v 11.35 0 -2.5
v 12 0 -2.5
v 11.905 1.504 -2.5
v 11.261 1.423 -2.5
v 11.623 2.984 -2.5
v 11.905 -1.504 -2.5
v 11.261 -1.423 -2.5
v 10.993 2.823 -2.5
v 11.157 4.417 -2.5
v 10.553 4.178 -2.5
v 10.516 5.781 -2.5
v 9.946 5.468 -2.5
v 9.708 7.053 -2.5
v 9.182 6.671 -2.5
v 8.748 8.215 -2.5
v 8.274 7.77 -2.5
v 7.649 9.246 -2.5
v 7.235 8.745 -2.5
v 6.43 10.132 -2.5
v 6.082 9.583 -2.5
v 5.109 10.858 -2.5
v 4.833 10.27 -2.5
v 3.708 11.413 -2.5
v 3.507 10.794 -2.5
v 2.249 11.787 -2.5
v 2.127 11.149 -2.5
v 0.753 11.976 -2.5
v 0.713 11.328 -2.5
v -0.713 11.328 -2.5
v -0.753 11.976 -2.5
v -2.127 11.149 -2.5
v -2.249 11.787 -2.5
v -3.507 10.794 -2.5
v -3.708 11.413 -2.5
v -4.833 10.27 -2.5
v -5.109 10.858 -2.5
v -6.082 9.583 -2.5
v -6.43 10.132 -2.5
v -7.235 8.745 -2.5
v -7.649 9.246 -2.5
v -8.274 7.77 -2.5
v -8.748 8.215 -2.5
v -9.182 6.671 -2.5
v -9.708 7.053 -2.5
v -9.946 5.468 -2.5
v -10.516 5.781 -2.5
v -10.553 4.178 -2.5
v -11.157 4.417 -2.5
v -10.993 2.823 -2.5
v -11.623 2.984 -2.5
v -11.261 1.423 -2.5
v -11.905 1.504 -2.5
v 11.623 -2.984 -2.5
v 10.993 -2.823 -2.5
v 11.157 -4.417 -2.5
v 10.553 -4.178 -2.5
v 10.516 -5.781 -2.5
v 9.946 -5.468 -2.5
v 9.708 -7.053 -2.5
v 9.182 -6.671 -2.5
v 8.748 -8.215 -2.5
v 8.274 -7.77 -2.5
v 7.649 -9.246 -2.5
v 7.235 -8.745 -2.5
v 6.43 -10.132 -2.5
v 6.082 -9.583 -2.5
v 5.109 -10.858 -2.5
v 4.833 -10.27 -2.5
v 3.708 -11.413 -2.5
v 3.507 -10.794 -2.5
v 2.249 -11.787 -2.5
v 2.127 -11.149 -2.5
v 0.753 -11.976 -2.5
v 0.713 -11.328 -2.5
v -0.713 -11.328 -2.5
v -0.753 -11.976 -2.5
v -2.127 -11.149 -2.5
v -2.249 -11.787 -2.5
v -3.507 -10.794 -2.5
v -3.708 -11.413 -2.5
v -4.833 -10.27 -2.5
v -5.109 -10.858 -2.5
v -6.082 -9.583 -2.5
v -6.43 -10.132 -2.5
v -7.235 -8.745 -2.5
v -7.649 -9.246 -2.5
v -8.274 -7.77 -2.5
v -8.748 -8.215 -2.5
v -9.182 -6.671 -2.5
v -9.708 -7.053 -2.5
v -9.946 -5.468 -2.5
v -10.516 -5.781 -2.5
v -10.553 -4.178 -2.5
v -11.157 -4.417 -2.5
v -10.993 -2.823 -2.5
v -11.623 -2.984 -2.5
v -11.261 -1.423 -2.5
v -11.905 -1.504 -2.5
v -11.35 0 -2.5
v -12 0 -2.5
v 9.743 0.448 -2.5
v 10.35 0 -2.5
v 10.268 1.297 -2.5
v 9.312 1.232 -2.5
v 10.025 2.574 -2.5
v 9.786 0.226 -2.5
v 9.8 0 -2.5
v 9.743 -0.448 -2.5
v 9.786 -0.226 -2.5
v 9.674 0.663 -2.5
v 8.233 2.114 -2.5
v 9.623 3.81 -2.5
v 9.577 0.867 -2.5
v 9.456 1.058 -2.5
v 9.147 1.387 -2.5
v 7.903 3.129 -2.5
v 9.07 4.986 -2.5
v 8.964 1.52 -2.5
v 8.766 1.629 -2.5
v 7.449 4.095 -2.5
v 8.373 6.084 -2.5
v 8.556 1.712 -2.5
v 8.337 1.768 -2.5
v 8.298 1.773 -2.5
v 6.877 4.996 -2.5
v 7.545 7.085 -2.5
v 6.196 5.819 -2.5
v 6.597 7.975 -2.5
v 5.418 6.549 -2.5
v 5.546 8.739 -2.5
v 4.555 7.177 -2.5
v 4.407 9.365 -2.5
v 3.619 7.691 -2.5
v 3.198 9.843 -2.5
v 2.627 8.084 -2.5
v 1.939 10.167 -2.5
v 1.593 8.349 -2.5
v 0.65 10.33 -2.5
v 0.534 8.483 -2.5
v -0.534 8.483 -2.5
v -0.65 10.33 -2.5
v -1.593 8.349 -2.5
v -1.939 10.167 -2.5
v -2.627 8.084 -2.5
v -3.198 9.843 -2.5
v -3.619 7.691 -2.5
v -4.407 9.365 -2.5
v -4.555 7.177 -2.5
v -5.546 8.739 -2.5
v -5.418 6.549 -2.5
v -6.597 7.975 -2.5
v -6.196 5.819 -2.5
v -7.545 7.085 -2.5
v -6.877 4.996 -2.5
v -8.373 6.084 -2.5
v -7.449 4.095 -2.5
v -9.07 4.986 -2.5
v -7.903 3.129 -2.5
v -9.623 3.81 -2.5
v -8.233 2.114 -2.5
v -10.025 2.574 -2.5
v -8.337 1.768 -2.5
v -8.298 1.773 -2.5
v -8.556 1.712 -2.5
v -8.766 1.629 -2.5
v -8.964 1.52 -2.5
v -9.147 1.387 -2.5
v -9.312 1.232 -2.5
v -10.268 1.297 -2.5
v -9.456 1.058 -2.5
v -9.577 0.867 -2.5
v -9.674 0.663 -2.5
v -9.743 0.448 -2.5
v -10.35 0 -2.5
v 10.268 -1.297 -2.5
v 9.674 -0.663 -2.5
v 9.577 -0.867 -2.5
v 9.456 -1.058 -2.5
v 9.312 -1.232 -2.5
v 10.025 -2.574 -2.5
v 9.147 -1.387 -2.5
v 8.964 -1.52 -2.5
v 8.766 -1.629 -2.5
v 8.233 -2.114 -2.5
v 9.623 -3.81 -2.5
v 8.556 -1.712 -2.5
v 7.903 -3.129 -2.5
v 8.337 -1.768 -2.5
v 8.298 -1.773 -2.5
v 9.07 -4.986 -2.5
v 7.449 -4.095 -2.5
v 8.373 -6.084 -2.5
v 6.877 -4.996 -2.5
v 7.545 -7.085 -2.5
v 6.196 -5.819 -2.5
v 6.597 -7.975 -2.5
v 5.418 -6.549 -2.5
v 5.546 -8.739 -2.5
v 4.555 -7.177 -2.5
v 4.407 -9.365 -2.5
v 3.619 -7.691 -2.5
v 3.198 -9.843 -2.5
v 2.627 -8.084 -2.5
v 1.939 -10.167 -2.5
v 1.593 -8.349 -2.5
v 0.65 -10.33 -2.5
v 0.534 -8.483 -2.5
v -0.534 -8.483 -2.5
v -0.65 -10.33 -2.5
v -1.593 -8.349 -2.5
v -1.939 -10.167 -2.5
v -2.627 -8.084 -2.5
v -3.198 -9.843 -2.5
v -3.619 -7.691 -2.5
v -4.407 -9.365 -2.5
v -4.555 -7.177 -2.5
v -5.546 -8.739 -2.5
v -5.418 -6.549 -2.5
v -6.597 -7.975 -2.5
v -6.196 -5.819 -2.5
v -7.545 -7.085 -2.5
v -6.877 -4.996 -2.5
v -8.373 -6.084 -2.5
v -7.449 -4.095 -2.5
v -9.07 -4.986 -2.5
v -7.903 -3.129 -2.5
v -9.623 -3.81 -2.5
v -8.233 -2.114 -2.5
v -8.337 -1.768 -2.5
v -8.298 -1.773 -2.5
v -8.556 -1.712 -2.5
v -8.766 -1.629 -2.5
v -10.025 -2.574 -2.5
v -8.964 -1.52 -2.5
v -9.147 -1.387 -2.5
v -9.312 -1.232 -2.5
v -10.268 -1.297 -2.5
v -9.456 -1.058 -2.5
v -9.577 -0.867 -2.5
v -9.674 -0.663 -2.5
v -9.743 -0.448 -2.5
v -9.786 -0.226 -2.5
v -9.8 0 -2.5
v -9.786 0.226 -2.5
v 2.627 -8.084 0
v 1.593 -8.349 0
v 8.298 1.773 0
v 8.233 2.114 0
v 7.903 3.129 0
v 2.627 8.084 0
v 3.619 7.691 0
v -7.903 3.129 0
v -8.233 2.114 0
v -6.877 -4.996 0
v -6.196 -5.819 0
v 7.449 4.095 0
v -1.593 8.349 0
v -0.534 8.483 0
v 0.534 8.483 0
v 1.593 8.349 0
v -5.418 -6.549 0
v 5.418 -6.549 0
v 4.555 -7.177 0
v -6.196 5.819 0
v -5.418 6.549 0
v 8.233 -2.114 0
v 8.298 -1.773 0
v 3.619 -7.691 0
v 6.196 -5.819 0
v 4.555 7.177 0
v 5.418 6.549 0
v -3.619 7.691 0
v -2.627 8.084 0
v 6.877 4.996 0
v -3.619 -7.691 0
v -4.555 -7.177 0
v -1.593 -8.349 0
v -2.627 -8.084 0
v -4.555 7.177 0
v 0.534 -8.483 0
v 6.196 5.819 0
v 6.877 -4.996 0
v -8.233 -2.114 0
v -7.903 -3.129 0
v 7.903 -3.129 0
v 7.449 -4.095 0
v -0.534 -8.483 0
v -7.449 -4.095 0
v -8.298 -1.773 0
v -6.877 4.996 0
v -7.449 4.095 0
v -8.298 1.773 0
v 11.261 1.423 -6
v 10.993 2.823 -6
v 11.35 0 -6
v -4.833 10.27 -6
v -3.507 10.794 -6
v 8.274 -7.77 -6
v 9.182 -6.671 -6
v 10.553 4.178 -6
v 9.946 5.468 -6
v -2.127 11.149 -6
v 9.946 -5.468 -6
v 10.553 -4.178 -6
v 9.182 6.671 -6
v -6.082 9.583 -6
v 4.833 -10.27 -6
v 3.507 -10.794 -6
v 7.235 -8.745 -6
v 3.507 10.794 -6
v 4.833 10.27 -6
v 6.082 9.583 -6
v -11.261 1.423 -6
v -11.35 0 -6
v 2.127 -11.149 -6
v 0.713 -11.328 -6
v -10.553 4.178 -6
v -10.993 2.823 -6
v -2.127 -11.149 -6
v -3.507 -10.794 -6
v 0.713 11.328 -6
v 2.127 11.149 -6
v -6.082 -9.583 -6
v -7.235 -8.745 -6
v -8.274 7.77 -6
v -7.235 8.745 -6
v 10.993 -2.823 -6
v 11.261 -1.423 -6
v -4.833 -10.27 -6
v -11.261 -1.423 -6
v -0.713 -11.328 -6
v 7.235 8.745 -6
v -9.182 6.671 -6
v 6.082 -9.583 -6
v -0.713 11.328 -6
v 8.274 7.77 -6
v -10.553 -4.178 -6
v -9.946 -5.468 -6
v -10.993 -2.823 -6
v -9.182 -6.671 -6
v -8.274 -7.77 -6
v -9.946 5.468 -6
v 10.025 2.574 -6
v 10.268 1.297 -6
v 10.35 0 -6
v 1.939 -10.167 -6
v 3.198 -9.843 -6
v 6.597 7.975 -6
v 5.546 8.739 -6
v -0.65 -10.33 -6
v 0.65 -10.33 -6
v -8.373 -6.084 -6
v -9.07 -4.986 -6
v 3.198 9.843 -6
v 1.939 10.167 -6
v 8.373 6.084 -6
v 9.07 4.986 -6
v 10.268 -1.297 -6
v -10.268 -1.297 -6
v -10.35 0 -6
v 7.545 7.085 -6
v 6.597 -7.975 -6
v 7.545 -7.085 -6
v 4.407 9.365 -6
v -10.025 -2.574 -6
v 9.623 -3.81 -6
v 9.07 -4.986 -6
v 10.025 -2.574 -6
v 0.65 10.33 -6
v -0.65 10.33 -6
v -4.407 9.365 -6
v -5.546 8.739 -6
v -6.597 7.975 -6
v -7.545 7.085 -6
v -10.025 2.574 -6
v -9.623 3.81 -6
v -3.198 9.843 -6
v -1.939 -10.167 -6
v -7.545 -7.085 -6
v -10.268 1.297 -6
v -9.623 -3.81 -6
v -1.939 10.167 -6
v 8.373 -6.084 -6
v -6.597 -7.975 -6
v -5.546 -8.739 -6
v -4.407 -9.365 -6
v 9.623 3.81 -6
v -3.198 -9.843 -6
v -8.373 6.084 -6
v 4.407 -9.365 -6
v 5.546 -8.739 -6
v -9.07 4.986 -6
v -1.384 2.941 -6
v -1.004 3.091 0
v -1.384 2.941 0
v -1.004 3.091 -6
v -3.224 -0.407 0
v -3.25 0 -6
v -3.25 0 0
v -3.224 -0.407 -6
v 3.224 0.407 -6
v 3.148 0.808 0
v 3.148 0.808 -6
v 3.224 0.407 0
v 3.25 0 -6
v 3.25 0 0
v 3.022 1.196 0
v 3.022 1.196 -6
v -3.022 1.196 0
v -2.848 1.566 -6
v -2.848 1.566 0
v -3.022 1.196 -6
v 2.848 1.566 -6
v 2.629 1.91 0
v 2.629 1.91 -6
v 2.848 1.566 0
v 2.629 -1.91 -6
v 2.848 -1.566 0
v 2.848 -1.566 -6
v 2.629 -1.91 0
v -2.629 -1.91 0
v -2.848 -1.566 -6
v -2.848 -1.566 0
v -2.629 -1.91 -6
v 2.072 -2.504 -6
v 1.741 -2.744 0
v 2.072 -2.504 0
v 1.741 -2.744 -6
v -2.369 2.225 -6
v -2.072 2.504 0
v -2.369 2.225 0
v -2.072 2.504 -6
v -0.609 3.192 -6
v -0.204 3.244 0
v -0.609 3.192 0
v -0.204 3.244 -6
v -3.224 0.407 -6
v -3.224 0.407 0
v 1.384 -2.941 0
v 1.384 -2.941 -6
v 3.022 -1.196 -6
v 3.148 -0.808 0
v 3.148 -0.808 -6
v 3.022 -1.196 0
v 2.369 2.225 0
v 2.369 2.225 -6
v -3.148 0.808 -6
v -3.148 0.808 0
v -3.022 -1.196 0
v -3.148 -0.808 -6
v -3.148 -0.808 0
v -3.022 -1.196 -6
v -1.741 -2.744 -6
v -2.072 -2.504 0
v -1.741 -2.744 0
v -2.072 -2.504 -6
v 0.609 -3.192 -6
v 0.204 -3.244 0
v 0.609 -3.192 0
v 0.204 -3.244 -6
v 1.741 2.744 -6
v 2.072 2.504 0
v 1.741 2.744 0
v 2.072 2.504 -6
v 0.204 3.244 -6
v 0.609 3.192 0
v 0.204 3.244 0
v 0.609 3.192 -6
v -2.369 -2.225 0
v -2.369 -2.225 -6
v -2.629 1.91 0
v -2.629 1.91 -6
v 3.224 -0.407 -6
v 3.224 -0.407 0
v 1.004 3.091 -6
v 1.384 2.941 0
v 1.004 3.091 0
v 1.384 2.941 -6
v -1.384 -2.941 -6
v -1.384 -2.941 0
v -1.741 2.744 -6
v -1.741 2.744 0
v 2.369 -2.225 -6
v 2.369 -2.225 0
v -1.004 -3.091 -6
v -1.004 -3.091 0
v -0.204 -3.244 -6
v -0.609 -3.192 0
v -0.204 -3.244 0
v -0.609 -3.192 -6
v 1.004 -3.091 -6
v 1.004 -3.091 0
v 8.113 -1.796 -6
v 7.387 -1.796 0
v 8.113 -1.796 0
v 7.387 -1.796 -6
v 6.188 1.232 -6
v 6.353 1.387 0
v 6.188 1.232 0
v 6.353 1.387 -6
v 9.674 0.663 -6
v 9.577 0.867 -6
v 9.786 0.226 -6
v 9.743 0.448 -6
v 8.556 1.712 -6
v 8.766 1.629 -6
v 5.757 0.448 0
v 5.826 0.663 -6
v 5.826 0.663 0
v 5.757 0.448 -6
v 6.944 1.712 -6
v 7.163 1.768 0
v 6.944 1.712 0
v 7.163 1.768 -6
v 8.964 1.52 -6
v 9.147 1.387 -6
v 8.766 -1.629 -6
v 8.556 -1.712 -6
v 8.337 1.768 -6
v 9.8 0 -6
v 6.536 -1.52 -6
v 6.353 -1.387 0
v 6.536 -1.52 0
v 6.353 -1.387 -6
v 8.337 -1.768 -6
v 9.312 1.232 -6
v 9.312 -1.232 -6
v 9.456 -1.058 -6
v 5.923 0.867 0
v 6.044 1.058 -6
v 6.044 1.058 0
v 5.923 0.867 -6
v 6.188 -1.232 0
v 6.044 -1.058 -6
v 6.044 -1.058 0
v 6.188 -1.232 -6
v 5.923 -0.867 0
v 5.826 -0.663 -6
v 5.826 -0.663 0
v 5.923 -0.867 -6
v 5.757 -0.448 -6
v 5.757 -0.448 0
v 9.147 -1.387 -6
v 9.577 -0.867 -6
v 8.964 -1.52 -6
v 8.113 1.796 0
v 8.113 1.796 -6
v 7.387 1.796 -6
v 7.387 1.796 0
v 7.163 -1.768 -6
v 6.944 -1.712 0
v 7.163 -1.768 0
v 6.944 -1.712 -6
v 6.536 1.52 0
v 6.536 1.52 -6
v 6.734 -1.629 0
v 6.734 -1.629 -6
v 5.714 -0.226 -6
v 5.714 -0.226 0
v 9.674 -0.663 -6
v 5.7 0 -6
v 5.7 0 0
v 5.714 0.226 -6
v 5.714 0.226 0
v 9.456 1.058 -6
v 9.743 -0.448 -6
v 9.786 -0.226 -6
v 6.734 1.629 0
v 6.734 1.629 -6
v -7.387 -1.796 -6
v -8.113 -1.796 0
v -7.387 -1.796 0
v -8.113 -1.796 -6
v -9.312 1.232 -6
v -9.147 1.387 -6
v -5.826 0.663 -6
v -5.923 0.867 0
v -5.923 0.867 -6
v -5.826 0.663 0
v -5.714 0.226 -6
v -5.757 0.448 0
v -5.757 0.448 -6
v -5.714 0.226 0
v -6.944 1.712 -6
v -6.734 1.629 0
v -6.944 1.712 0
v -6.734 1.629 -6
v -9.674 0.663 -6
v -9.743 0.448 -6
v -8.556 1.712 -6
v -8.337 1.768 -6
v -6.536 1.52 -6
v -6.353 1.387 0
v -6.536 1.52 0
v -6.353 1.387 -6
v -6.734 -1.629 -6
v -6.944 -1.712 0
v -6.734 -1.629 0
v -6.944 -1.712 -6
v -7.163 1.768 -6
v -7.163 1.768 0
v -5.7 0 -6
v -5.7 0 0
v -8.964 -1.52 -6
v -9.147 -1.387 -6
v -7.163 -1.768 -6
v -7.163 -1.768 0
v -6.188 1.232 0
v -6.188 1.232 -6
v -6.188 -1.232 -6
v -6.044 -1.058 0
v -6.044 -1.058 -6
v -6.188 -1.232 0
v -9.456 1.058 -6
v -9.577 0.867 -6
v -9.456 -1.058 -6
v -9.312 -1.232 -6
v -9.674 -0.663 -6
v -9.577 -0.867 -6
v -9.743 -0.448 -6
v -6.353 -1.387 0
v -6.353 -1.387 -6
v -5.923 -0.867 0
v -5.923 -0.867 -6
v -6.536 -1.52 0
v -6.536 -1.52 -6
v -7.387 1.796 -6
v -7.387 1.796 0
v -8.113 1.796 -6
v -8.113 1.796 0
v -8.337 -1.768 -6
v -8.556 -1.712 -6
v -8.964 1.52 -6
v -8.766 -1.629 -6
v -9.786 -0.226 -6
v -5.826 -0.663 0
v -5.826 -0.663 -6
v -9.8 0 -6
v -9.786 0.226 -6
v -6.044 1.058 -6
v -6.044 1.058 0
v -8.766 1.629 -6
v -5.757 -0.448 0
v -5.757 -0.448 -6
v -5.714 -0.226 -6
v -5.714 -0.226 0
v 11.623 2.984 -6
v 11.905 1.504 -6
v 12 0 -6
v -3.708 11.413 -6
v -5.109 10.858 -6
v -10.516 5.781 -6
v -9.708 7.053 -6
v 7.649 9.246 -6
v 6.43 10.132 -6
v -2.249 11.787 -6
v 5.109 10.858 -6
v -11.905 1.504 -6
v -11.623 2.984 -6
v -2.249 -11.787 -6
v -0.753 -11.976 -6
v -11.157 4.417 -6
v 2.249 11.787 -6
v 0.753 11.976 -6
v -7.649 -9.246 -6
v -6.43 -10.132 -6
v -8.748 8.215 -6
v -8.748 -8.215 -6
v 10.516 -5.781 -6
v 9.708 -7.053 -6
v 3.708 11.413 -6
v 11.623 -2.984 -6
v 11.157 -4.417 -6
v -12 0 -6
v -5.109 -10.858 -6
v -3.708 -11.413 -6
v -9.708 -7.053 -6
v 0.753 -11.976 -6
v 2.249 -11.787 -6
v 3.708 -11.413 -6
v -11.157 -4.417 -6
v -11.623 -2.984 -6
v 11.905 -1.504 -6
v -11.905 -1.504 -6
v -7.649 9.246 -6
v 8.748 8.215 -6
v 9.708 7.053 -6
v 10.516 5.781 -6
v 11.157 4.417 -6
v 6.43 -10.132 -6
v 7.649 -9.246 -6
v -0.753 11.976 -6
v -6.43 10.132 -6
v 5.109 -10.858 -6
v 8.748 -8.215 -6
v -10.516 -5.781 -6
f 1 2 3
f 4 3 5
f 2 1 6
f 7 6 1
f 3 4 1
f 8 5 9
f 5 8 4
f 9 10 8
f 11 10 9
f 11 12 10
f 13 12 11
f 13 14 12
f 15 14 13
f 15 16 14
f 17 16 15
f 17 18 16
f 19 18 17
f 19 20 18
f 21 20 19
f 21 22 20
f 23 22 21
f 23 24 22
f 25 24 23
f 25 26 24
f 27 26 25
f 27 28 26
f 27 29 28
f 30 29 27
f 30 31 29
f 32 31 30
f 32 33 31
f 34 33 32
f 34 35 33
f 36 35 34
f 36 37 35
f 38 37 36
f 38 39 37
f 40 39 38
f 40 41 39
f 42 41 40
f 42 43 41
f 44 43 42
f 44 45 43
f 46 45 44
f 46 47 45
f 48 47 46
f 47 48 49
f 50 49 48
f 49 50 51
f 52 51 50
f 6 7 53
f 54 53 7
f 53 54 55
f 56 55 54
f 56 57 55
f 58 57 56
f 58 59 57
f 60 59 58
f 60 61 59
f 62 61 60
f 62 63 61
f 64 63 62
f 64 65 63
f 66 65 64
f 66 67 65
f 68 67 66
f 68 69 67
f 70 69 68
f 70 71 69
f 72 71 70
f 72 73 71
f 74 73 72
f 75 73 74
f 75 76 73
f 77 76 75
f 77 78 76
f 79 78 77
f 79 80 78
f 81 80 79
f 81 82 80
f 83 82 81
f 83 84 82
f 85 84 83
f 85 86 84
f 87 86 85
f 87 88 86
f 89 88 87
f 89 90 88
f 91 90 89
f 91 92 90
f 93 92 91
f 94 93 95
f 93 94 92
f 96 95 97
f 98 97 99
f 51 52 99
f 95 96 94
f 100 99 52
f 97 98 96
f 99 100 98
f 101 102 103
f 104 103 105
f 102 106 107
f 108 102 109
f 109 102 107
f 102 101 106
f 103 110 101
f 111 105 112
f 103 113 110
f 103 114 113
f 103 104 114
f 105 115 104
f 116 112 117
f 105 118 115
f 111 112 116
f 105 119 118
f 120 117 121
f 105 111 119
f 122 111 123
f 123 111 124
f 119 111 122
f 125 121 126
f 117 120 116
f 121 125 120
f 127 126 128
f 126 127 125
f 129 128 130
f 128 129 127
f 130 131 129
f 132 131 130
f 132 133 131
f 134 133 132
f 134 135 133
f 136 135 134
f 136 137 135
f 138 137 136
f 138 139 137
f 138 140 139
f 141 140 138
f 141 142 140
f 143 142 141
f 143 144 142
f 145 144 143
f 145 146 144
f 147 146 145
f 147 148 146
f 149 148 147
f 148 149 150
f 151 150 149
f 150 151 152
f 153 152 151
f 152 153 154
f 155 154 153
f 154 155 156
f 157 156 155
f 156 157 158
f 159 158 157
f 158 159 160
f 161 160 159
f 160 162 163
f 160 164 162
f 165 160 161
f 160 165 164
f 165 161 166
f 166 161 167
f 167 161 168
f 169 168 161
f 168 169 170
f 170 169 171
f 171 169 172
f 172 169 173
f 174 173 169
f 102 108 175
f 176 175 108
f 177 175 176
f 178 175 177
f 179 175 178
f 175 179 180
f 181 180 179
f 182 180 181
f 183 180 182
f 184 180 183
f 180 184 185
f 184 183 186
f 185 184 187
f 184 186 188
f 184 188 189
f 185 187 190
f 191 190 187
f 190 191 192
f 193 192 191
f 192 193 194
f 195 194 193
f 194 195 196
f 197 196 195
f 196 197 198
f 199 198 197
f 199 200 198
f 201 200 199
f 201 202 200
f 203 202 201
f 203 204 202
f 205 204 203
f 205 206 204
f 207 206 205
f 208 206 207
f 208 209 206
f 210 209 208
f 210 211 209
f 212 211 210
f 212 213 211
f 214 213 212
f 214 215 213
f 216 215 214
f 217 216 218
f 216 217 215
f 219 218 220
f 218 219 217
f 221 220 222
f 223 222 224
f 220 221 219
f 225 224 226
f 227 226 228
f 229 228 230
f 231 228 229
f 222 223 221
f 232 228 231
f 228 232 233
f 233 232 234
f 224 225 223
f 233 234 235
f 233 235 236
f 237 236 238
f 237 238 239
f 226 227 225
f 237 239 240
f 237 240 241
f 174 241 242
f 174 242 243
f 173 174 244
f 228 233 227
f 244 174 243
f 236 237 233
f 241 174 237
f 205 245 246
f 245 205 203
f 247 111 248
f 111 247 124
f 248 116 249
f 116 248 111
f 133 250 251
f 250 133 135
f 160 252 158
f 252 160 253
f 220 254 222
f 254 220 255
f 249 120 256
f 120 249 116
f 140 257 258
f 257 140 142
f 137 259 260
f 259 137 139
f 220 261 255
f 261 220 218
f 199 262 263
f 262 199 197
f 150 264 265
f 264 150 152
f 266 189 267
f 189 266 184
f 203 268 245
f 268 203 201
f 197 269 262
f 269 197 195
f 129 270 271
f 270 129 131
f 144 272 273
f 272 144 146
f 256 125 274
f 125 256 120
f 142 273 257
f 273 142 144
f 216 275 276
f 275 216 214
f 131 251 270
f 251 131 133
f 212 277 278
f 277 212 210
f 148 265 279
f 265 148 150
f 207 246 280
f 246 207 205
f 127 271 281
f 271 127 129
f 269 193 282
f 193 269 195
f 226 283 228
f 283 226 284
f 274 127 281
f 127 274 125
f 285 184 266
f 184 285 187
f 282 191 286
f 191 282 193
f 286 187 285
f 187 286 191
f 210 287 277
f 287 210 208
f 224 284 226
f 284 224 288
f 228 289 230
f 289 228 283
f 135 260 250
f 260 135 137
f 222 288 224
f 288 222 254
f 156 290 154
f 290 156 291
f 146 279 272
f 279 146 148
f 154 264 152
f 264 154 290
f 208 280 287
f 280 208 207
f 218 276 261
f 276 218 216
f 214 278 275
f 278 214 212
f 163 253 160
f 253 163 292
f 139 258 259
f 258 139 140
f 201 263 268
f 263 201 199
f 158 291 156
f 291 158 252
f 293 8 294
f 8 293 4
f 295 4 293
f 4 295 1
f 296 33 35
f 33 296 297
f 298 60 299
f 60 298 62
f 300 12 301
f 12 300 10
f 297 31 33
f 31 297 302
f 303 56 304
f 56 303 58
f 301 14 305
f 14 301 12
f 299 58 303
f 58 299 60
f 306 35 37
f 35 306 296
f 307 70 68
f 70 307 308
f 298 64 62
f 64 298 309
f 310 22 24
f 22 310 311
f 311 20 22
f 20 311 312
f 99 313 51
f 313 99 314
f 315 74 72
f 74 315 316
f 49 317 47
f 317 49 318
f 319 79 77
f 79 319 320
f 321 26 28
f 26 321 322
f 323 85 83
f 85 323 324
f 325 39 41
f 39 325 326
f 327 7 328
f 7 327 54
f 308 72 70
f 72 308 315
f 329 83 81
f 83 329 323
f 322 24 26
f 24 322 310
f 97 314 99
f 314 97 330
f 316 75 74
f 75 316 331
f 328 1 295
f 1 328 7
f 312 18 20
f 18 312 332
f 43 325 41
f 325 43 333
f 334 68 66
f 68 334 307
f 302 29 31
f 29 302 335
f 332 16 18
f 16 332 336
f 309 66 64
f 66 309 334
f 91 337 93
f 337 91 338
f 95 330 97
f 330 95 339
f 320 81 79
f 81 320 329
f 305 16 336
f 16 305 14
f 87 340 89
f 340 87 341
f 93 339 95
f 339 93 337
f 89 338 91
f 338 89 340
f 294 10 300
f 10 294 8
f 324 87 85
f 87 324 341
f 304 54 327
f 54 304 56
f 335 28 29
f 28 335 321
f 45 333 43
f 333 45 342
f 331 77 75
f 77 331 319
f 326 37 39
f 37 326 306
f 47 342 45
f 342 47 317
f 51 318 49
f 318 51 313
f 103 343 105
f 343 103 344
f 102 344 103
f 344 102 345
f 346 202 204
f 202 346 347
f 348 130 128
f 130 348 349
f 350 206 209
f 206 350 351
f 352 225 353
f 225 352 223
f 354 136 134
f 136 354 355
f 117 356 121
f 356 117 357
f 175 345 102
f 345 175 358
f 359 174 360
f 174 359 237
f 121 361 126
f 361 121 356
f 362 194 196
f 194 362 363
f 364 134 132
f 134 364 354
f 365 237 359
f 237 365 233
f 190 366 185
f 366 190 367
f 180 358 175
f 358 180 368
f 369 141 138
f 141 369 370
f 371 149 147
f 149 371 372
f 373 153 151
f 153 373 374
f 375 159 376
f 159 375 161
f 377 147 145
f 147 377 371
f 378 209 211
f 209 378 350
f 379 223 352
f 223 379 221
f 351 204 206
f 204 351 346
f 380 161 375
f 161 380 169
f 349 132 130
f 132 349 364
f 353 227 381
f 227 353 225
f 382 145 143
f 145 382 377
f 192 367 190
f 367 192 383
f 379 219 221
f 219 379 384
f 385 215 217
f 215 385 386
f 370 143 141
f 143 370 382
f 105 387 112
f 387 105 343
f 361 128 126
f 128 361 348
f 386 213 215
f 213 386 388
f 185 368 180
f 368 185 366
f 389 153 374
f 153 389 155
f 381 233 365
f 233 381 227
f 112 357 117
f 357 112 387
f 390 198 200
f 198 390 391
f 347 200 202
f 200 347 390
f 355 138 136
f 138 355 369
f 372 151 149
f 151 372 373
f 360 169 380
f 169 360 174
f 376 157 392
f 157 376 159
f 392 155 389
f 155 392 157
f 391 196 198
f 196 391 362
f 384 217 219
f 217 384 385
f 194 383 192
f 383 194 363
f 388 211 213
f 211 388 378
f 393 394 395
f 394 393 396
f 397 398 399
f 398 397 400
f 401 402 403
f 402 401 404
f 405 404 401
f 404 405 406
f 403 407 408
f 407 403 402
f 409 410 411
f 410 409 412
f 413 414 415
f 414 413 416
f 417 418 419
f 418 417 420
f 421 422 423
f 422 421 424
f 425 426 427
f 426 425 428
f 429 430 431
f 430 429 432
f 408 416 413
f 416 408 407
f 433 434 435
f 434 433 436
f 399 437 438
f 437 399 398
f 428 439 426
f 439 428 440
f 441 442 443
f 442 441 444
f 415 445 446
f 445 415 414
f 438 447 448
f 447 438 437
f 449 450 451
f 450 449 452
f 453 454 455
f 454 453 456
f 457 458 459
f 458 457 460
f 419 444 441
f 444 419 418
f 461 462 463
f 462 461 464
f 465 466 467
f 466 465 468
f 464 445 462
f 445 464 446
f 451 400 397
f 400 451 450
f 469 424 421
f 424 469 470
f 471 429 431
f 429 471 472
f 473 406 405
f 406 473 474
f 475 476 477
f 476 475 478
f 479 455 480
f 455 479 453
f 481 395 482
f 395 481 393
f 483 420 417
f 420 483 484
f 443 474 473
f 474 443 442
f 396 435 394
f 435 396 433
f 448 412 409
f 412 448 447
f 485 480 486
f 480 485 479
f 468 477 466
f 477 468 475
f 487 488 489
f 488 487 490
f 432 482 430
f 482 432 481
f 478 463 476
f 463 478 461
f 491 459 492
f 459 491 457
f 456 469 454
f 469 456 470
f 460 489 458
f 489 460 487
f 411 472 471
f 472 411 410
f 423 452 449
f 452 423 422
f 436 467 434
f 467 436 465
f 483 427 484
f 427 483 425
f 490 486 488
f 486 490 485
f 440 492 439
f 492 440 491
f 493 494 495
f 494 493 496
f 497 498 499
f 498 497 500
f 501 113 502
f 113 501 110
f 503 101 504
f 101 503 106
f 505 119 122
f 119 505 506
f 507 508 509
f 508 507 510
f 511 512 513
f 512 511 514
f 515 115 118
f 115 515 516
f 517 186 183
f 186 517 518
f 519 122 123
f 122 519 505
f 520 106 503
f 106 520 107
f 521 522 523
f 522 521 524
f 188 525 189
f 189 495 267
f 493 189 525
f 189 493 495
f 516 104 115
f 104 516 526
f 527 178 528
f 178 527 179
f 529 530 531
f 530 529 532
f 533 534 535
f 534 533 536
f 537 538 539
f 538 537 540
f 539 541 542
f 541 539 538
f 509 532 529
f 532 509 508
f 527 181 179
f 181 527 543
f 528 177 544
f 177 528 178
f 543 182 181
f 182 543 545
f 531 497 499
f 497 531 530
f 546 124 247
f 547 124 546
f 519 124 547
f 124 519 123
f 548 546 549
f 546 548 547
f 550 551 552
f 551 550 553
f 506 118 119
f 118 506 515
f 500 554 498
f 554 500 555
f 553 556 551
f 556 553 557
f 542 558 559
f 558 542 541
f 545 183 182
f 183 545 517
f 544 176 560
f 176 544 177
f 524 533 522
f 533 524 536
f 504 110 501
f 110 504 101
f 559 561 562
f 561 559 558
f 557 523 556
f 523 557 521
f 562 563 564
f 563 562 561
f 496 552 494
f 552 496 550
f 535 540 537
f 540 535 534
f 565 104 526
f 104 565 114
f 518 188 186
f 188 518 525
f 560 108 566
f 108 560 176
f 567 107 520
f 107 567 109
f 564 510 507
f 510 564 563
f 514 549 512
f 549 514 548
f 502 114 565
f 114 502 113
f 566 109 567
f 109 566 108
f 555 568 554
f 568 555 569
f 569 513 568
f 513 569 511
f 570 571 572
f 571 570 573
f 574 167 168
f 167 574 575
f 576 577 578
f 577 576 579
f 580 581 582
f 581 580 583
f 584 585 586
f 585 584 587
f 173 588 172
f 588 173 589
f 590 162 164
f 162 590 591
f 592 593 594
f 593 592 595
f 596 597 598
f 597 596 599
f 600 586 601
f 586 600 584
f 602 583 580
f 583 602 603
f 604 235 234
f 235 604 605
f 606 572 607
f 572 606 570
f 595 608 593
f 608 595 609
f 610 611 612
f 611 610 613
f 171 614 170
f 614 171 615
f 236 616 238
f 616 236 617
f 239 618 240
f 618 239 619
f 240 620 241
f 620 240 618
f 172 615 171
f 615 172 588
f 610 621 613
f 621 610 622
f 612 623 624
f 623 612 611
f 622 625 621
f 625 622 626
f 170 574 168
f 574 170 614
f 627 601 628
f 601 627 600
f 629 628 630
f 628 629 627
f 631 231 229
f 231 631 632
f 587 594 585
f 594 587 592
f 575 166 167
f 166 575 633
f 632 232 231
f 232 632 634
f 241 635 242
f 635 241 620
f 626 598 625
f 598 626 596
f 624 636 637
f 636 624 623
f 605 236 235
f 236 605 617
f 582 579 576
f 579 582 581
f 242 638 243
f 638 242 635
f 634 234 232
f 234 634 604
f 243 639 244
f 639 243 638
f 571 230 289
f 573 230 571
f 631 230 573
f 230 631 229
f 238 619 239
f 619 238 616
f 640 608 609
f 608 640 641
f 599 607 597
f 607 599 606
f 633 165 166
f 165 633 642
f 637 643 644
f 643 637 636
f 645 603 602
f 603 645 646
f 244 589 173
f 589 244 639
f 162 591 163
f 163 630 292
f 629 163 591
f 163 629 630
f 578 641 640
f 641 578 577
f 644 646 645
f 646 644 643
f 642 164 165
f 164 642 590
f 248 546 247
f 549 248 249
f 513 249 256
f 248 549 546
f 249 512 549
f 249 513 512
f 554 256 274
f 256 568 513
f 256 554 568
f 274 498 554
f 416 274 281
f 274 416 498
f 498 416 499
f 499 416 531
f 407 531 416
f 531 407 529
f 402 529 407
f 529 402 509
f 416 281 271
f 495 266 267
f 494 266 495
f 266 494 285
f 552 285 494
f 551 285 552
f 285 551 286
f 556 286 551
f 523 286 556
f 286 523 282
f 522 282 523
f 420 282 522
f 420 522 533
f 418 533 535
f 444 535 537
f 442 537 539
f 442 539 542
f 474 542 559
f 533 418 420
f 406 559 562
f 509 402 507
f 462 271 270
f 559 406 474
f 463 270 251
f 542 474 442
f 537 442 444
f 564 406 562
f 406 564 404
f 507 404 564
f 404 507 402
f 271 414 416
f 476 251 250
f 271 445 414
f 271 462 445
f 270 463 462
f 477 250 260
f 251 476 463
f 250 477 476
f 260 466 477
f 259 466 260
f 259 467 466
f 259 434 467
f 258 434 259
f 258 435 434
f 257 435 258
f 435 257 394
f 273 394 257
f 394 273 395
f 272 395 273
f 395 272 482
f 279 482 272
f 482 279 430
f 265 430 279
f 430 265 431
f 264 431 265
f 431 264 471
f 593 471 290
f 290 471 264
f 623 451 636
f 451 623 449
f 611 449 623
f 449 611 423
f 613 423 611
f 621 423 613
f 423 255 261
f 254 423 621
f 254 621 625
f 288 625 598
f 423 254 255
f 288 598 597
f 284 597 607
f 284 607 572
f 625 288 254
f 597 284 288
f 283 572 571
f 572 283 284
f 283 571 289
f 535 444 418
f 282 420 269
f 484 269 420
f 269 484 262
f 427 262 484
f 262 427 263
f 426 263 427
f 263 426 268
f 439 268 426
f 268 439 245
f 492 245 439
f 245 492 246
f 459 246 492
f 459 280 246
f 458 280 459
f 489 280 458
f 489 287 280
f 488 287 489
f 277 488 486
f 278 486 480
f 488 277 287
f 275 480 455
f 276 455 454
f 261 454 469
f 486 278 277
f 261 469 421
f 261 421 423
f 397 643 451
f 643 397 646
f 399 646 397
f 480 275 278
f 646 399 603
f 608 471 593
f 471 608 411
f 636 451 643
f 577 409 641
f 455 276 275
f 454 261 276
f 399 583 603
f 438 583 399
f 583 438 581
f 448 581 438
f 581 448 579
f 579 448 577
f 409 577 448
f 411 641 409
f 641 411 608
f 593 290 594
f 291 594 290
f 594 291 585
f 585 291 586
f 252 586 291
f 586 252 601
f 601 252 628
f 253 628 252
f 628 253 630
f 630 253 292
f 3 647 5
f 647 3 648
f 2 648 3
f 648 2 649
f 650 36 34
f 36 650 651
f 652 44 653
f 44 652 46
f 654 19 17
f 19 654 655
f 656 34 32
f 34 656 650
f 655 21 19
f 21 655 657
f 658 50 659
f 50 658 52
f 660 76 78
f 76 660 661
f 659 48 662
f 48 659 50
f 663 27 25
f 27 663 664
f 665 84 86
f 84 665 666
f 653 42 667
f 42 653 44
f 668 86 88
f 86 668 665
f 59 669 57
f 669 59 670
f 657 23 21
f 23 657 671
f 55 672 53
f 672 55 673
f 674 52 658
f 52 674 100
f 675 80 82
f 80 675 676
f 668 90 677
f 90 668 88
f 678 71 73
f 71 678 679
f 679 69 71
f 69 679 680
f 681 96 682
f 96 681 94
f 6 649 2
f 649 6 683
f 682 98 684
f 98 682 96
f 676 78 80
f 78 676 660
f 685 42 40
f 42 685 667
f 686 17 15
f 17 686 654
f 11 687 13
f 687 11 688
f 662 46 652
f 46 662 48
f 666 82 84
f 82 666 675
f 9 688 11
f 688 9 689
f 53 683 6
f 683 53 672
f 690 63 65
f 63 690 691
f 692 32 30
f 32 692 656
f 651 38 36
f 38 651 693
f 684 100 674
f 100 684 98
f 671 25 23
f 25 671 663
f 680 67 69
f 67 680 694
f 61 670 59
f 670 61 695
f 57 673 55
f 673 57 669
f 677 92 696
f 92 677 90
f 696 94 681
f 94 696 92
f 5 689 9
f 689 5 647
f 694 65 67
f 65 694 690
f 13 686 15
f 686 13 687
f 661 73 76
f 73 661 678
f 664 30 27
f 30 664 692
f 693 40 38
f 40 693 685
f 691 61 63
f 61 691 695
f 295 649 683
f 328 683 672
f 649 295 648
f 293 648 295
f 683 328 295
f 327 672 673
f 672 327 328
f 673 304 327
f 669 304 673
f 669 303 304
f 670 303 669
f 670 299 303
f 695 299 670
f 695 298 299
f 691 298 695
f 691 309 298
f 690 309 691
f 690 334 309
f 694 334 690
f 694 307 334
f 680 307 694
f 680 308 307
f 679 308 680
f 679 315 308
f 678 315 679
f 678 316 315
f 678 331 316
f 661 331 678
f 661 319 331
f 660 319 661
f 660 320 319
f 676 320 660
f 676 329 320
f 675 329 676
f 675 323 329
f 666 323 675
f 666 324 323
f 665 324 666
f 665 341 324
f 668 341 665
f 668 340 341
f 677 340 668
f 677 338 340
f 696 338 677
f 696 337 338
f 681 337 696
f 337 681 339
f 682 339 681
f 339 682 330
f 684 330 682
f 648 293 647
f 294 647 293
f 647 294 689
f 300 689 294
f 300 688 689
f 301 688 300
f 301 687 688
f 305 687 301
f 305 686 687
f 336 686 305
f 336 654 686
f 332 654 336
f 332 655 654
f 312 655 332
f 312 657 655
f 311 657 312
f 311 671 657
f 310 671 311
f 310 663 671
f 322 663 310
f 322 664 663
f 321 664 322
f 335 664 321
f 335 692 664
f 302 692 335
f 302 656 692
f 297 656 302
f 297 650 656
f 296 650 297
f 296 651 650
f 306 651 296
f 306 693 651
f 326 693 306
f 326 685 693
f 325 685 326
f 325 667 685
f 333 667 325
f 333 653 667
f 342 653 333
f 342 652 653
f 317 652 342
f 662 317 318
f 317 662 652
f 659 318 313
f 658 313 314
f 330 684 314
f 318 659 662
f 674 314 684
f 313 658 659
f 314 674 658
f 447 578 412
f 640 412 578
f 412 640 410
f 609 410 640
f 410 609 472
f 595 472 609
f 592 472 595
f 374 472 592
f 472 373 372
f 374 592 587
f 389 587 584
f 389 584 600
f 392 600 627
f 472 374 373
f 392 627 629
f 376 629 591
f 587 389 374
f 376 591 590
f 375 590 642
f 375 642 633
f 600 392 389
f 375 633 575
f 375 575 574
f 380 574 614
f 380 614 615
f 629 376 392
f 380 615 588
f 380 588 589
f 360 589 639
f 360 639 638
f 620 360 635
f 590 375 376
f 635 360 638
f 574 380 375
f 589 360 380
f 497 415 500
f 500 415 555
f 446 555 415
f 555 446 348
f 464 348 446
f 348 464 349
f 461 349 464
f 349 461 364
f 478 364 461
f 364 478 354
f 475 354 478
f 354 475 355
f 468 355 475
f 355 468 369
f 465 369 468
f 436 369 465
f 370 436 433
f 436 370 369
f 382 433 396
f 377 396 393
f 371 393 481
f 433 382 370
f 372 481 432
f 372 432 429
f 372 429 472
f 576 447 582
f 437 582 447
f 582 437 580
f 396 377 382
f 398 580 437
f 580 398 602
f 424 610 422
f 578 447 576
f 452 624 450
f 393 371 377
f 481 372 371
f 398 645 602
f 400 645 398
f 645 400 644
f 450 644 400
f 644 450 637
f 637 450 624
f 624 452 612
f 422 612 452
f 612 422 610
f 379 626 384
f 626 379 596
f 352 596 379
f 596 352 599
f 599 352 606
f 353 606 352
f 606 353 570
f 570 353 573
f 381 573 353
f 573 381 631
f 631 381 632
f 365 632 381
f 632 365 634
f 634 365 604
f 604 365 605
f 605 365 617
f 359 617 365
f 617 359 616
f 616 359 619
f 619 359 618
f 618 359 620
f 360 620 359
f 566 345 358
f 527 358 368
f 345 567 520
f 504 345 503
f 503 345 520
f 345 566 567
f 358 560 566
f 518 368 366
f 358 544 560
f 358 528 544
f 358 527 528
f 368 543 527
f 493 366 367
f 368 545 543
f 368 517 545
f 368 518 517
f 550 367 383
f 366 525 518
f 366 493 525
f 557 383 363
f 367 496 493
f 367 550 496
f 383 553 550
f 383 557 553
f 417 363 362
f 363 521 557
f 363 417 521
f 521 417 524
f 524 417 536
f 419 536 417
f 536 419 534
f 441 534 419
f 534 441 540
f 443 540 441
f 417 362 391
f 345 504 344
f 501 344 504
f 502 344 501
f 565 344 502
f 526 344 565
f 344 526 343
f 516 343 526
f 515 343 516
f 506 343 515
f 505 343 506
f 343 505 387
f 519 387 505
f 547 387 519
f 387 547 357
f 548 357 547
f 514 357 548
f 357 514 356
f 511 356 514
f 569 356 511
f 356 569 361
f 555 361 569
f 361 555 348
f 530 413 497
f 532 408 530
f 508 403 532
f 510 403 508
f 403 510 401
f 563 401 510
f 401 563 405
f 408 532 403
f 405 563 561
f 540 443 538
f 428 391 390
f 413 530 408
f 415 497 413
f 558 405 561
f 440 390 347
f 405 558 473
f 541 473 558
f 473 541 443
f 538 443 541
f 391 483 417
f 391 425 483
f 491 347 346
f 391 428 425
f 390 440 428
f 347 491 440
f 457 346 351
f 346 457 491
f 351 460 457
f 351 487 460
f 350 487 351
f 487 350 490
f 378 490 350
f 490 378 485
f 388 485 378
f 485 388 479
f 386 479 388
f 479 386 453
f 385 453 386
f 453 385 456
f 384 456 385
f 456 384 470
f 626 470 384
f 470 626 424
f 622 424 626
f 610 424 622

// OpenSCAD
$fn = 50;


difference() {
	union() {
		translate(v = [0, 0, -6.0000000000]) {
			rotate(a = [0, 0, 0]) {
				cylinder(h = 12, r = 12.0000000000);
			}
		}
	}
	union() {
		translate(v = [0, 0, 0]) {
			rotate(a = [0, 0, 0]) {
				translate(v = [0, 0, -2.5000000000]) {
					union() {
						difference() {
							translate(v = [0, 0, 0]) {
								rotate(a = [0, 0, 0]) {
									cylinder(h = 5, r = 13.2000000000);
								}
							}
							translate(v = [0, 0, 0]) {
								rotate(a = [0, 0, 0]) {
									cylinder(h = 5, r = 8.5000000000);
								}
							}
						}
						difference() {
							translate(v = [0, 0, -50]) {
								rotate(a = [0, 0, 0]) {
									cylinder(h = 100, r = 11.3500000000);
								}
							}
							translate(v = [0, 0, -50]) {
								rotate(a = [0, 0, 0]) {
									cylinder(h = 100, r = 10.3500000000);
								}
							}
						}
					}
				}
			}
		}
		translate(v = [-15.0000000000, -15.0000000000, -125.0000000000]) {
			rotate(a = [0, 0, 0]) {
				cylinder(h = 250, r = 3.2500000000);
			}
		}
		translate(v = [-15.0000000000, 15.0000000000, -125.0000000000]) {
			rotate(a = [0, 0, 0]) {
				cylinder(h = 250, r = 3.2500000000);
			}
		}
		translate(v = [15.0000000000, -15.0000000000, -125.0000000000]) {
			rotate(a = [0, 0, 0]) {
				cylinder(h = 250, r = 3.2500000000);
			}
		}
		translate(v = [15.0000000000, 15.0000000000, -125.0000000000]) {
			rotate(a = [0, 0, 0]) {
				cylinder(h = 250, r = 3.2500000000);
			}
		}
		translate(v = [0, 0, -125.0000000000]) {
			rotate(a = [0, 0, 0]) {
				cylinder(h = 250, r = 3.2500000000);
			}
		}
		translate(v = [17.0000000000, 0.0000000000, 4.1000000000]) {
			rotate(a = [0, 0, 15.0000000000]) {
				cylinder(h = 1.9000000000, r1 = 1.8000000000, r2 = 3.6000000000);
			}
		}
		translate(v = [17.0000000000, 0.0000000000, -6.0000000000]) {
			rotate(a = [0, 0, 15.0000000000]) {
				cylinder(h = 12, r = 1.8000000000);
			}
		}
		translate(v = [17.0000000000, 0.0000000000, -6.0000000000]) {
			rotate(a = [0, 0, 15.0000000000]) {
				translate(v = [0, 0, 0]) {
					rotate(a = [0, 0, 15.0000000000]) {
						linear_extrude(height = 3) {
							polygon(points = [[3.4620000000, 0.0000000000], [1.7310000000, 2.9981799479], [-1.7310000000, 2.9981799479], [-3.4620000000, 0.0000000000], [-1.7310000000, -2.9981799479], [1.7310000000, -2.9981799479]]);
						}
					}
				}
			}
		}
		translate(v = [15.2500000000, -3.2500000000, -3.0000000000]) {
			rotate(a = [0, 0, 0]) {
				cube(size = [3.5000000000, 6.5000000000, 0.3000000000]);
			}
		}
		translate(v = [15.2500000000, -1.7500000000, -2.7000000000]) {
			rotate(a = [0, 0, 0]) {
				cube(size = [3.5000000000, 3.5000000000, 0.3000000000]);
			}
		}
		translate(v = [15.2500000000, -3.2500000000, -6.3000000000]) {
			rotate(a = [0, 0, 0]) {
				cube(size = [3.5000000000, 6.5000000000, 0.3000000000]);
			}
		}
		translate(v = [15.2500000000, -1.7500000000, -6.6000000000]) {
			rotate(a = [0, 0, 0]) {
				cube(size = [3.5000000000, 3.5000000000, 0.3000000000]);
			}
		}
		translate(v = [0.0000000000, -17.0000000000, -4.1000000000]) {
			rotate(a = [0, 180, 0]) {
				cylinder(h = 1.9000000000, r1 = 1.8000000000, r2 = 3.6000000000);
			}
		}
		translate(v = [0.0000000000, -17.0000000000, 6.0000000000]) {
			rotate(a = [0, 180, 0]) {
				cylinder(h = 12, r = 1.8000000000);
			}
		}
		translate(v = [0.0000000000, -17.0000000000, 3.0000000000]) {
			rotate(a = [0, 180, 0]) {
				translate(v = [0, 0, 0]) {
					rotate(a = [0, 180, 0]) {
						linear_extrude(height = 3) {
							polygon(points = [[3.4620000000, 0.0000000000], [1.7310000000, 2.9981799479], [-1.7310000000, 2.9981799479], [-3.4620000000, 0.0000000000], [-1.7310000000, -2.9981799479], [1.7310000000, -2.9981799479]]);
						}
					}
				}
			}
		}
		translate(v = [-1.7500000000, -20.2500000000, 6.0000000000]) {
			rotate(a = [0, 0, 0]) {
				cube(size = [3.5000000000, 6.5000000000, 0.3000000000]);
			}
		}
		translate(v = [-1.7500000000, -18.7500000000, 6.3000000000]) {
			rotate(a = [0, 0, 0]) {
				cube(size = [3.5000000000, 3.5000000000, 0.3000000000]);
			}
		}
		translate(v = [-1.7500000000, -20.2500000000, 2.7000000000]) {
			rotate(a = [0, 0, 0]) {
				cube(size = [3.5000000000, 6.5000000000, 0.3000000000]);
			}
		}
		translate(v = [-1.7500000000, -18.7500000000, 2.4000000000]) {
			rotate(a = [0, 0, 0]) {
				cube(size = [3.5000000000, 3.5000000000, 0.3000000000]);
			}
		}
		translate(v = [-17.0000000000, 0.0000000000, 4.1000000000]) {
			rotate(a = [0, 0, 15.0000000000]) {
				cylinder(h = 1.9000000000, r1 = 1.8000000000, r2 = 3.6000000000);
			}
		}
		translate(v = [-17.0000000000, 0.0000000000, -6.0000000000]) {
			rotate(a = [0, 0, 15.0000000000]) {
				cylinder(h = 12, r = 1.8000000000);
			}
		}
		translate(v = [-17.0000000000, 0.0000000000, -6.0000000000]) {
			rotate(a = [0, 0, 15.0000000000]) {
				translate(v = [0, 0, 0]) {
					rotate(a = [0, 0, 15.0000000000]) {
						linear_extrude(height = 3) {
							polygon(points = [[3.4620000000, 0.0000000000], [1.7310000000, 2.9981799479], [-1.7310000000, 2.9981799479], [-3.4620000000, 0.0000000000], [-1.7310000000, -2.9981799479], [1.7310000000, -2.9981799479]]);
						}
					}
				}
			}
		}
		translate(v = [-18.7500000000, -3.2500000000, -3.0000000000]) {
			rotate(a = [0, 0, 0]) {
				cube(size = [3.5000000000, 6.5000000000, 0.3000000000]);
			}
		}
		translate(v = [-18.7500000000, -1.7500000000, -2.7000000000]) {
			rotate(a = [0, 0, 0]) {
				cube(size = [3.5000000000, 3.5000000000, 0.3000000000]);
			}
		}
		translate(v = [-18.7500000000, -3.2500000000, -6.3000000000]) {
			rotate(a = [0, 0, 0]) {
				cube(size = [3.5000000000, 6.5000000000, 0.3000000000]);
			}
		}
		translate(v = [-18.7500000000, -1.7500000000, -6.6000000000]) {
			rotate(a = [0, 0, 0]) {
				cube(size = [3.5000000000, 3.5000000000, 0.3000000000]);
			}
		}
		translate(v = [0.0000000000, 17.0000000000, -4.1000000000]) {
			rotate(a = [0, 180, 0]) {
				cylinder(h = 1.9000000000, r1 = 1.8000000000, r2 = 3.6000000000);
			}
		}
		translate(v = [0.0000000000, 17.0000000000, 6.0000000000]) {
			rotate(a = [0, 180, 0]) {
				cylinder(h = 12, r = 1.8000000000);
			}
		}
		translate(v = [0.0000000000, 17.0000000000, 3.0000000000]) {
			rotate(a = [0, 180, 0]) {
				translate(v = [0, 0, 0]) {
					rotate(a = [0, 180, 0]) {
						linear_extrude(height = 3) {
							polygon(points = [[3.4620000000, 0.0000000000], [1.7310000000, 2.9981799479], [-1.7310000000, 2.9981799479], [-3.4620000000, 0.0000000000], [-1.7310000000, -2.9981799479], [1.7310000000, -2.9981799479]]);
						}
					}
				}
			}
		}
		translate(v = [-1.7500000000, 13.7500000000, 6.0000000000]) {
			rotate(a = [0, 0, 0]) {
				cube(size = [3.5000000000, 6.5000000000, 0.3000000000]);
			}
		}
		translate(v = [-1.7500000000, 15.2500000000, 6.3000000000]) {
			rotate(a = [0, 0, 0]) {
				cube(size = [3.5000000000, 3.5000000000, 0.3000000000]);
			}
		}
		translate(v = [-1.7500000000, 13.7500000000, 2.7000000000]) {
			rotate(a = [0, 0, 0]) {
				cube(size = [3.5000000000, 6.5000000000, 0.3000000000]);
			}
		}
		translate(v = [-1.7500000000, 15.2500000000, 2.4000000000]) {
			rotate(a = [0, 0, 0]) {
				cube(size = [3.5000000000, 3.5000000000, 0.3000000000]);
			}
		}
		translate(v = [7.7500000000, 0, -125.0000000000]) {
			rotate(a = [0, 0, 0]) {
				hull() {
					translate(v = [0.2500000000, 0, 0]) {
						rotate(a = [0, 0, 0]) {
							translate(v = [0, 0, 0]) {
								rotate(a = [0, 0, 0]) {
									cylinder(h = 250, r = 1.8000000000);
								}
							}
						}
					}
					translate(v = [-0.2500000000, 0, 0]) {
						rotate(a = [0, 0, 0]) {
							translate(v = [0, 0, 0]) {
								rotate(a = [0, 0, 0]) {
									cylinder(h = 250, r = 1.8000000000);
								}
							}
						}
					}
				}
			}
		}
		translate(v = [-7.7500000000, 0, -125.0000000000]) {
			rotate(a = [0, 0, 0]) {
				hull() {
					translate(v = [0.2500000000, 0, 0]) {
						rotate(a = [0, 0, 0]) {
							translate(v = [0, 0, 0]) {
								rotate(a = [0, 0, 0]) {
									cylinder(h = 250, r = 1.8000000000);
								}
							}
						}
					}
					translate(v = [-0.2500000000, 0, 0]) {
						rotate(a = [0, 0, 0]) {
							translate(v = [0, 0, 0]) {
								rotate(a = [0, 0, 0]) {
									cylinder(h = 250, r = 1.8000000000);
								}
							}
						}
					}
				}
			}
		}
		translate(v = [-250.0000000000, -250.0000000000, 0]) {
			rotate(a = [0, 0, 0]) {
				cube(size = [500, 500, 500]);
			}
		}
	}
}
